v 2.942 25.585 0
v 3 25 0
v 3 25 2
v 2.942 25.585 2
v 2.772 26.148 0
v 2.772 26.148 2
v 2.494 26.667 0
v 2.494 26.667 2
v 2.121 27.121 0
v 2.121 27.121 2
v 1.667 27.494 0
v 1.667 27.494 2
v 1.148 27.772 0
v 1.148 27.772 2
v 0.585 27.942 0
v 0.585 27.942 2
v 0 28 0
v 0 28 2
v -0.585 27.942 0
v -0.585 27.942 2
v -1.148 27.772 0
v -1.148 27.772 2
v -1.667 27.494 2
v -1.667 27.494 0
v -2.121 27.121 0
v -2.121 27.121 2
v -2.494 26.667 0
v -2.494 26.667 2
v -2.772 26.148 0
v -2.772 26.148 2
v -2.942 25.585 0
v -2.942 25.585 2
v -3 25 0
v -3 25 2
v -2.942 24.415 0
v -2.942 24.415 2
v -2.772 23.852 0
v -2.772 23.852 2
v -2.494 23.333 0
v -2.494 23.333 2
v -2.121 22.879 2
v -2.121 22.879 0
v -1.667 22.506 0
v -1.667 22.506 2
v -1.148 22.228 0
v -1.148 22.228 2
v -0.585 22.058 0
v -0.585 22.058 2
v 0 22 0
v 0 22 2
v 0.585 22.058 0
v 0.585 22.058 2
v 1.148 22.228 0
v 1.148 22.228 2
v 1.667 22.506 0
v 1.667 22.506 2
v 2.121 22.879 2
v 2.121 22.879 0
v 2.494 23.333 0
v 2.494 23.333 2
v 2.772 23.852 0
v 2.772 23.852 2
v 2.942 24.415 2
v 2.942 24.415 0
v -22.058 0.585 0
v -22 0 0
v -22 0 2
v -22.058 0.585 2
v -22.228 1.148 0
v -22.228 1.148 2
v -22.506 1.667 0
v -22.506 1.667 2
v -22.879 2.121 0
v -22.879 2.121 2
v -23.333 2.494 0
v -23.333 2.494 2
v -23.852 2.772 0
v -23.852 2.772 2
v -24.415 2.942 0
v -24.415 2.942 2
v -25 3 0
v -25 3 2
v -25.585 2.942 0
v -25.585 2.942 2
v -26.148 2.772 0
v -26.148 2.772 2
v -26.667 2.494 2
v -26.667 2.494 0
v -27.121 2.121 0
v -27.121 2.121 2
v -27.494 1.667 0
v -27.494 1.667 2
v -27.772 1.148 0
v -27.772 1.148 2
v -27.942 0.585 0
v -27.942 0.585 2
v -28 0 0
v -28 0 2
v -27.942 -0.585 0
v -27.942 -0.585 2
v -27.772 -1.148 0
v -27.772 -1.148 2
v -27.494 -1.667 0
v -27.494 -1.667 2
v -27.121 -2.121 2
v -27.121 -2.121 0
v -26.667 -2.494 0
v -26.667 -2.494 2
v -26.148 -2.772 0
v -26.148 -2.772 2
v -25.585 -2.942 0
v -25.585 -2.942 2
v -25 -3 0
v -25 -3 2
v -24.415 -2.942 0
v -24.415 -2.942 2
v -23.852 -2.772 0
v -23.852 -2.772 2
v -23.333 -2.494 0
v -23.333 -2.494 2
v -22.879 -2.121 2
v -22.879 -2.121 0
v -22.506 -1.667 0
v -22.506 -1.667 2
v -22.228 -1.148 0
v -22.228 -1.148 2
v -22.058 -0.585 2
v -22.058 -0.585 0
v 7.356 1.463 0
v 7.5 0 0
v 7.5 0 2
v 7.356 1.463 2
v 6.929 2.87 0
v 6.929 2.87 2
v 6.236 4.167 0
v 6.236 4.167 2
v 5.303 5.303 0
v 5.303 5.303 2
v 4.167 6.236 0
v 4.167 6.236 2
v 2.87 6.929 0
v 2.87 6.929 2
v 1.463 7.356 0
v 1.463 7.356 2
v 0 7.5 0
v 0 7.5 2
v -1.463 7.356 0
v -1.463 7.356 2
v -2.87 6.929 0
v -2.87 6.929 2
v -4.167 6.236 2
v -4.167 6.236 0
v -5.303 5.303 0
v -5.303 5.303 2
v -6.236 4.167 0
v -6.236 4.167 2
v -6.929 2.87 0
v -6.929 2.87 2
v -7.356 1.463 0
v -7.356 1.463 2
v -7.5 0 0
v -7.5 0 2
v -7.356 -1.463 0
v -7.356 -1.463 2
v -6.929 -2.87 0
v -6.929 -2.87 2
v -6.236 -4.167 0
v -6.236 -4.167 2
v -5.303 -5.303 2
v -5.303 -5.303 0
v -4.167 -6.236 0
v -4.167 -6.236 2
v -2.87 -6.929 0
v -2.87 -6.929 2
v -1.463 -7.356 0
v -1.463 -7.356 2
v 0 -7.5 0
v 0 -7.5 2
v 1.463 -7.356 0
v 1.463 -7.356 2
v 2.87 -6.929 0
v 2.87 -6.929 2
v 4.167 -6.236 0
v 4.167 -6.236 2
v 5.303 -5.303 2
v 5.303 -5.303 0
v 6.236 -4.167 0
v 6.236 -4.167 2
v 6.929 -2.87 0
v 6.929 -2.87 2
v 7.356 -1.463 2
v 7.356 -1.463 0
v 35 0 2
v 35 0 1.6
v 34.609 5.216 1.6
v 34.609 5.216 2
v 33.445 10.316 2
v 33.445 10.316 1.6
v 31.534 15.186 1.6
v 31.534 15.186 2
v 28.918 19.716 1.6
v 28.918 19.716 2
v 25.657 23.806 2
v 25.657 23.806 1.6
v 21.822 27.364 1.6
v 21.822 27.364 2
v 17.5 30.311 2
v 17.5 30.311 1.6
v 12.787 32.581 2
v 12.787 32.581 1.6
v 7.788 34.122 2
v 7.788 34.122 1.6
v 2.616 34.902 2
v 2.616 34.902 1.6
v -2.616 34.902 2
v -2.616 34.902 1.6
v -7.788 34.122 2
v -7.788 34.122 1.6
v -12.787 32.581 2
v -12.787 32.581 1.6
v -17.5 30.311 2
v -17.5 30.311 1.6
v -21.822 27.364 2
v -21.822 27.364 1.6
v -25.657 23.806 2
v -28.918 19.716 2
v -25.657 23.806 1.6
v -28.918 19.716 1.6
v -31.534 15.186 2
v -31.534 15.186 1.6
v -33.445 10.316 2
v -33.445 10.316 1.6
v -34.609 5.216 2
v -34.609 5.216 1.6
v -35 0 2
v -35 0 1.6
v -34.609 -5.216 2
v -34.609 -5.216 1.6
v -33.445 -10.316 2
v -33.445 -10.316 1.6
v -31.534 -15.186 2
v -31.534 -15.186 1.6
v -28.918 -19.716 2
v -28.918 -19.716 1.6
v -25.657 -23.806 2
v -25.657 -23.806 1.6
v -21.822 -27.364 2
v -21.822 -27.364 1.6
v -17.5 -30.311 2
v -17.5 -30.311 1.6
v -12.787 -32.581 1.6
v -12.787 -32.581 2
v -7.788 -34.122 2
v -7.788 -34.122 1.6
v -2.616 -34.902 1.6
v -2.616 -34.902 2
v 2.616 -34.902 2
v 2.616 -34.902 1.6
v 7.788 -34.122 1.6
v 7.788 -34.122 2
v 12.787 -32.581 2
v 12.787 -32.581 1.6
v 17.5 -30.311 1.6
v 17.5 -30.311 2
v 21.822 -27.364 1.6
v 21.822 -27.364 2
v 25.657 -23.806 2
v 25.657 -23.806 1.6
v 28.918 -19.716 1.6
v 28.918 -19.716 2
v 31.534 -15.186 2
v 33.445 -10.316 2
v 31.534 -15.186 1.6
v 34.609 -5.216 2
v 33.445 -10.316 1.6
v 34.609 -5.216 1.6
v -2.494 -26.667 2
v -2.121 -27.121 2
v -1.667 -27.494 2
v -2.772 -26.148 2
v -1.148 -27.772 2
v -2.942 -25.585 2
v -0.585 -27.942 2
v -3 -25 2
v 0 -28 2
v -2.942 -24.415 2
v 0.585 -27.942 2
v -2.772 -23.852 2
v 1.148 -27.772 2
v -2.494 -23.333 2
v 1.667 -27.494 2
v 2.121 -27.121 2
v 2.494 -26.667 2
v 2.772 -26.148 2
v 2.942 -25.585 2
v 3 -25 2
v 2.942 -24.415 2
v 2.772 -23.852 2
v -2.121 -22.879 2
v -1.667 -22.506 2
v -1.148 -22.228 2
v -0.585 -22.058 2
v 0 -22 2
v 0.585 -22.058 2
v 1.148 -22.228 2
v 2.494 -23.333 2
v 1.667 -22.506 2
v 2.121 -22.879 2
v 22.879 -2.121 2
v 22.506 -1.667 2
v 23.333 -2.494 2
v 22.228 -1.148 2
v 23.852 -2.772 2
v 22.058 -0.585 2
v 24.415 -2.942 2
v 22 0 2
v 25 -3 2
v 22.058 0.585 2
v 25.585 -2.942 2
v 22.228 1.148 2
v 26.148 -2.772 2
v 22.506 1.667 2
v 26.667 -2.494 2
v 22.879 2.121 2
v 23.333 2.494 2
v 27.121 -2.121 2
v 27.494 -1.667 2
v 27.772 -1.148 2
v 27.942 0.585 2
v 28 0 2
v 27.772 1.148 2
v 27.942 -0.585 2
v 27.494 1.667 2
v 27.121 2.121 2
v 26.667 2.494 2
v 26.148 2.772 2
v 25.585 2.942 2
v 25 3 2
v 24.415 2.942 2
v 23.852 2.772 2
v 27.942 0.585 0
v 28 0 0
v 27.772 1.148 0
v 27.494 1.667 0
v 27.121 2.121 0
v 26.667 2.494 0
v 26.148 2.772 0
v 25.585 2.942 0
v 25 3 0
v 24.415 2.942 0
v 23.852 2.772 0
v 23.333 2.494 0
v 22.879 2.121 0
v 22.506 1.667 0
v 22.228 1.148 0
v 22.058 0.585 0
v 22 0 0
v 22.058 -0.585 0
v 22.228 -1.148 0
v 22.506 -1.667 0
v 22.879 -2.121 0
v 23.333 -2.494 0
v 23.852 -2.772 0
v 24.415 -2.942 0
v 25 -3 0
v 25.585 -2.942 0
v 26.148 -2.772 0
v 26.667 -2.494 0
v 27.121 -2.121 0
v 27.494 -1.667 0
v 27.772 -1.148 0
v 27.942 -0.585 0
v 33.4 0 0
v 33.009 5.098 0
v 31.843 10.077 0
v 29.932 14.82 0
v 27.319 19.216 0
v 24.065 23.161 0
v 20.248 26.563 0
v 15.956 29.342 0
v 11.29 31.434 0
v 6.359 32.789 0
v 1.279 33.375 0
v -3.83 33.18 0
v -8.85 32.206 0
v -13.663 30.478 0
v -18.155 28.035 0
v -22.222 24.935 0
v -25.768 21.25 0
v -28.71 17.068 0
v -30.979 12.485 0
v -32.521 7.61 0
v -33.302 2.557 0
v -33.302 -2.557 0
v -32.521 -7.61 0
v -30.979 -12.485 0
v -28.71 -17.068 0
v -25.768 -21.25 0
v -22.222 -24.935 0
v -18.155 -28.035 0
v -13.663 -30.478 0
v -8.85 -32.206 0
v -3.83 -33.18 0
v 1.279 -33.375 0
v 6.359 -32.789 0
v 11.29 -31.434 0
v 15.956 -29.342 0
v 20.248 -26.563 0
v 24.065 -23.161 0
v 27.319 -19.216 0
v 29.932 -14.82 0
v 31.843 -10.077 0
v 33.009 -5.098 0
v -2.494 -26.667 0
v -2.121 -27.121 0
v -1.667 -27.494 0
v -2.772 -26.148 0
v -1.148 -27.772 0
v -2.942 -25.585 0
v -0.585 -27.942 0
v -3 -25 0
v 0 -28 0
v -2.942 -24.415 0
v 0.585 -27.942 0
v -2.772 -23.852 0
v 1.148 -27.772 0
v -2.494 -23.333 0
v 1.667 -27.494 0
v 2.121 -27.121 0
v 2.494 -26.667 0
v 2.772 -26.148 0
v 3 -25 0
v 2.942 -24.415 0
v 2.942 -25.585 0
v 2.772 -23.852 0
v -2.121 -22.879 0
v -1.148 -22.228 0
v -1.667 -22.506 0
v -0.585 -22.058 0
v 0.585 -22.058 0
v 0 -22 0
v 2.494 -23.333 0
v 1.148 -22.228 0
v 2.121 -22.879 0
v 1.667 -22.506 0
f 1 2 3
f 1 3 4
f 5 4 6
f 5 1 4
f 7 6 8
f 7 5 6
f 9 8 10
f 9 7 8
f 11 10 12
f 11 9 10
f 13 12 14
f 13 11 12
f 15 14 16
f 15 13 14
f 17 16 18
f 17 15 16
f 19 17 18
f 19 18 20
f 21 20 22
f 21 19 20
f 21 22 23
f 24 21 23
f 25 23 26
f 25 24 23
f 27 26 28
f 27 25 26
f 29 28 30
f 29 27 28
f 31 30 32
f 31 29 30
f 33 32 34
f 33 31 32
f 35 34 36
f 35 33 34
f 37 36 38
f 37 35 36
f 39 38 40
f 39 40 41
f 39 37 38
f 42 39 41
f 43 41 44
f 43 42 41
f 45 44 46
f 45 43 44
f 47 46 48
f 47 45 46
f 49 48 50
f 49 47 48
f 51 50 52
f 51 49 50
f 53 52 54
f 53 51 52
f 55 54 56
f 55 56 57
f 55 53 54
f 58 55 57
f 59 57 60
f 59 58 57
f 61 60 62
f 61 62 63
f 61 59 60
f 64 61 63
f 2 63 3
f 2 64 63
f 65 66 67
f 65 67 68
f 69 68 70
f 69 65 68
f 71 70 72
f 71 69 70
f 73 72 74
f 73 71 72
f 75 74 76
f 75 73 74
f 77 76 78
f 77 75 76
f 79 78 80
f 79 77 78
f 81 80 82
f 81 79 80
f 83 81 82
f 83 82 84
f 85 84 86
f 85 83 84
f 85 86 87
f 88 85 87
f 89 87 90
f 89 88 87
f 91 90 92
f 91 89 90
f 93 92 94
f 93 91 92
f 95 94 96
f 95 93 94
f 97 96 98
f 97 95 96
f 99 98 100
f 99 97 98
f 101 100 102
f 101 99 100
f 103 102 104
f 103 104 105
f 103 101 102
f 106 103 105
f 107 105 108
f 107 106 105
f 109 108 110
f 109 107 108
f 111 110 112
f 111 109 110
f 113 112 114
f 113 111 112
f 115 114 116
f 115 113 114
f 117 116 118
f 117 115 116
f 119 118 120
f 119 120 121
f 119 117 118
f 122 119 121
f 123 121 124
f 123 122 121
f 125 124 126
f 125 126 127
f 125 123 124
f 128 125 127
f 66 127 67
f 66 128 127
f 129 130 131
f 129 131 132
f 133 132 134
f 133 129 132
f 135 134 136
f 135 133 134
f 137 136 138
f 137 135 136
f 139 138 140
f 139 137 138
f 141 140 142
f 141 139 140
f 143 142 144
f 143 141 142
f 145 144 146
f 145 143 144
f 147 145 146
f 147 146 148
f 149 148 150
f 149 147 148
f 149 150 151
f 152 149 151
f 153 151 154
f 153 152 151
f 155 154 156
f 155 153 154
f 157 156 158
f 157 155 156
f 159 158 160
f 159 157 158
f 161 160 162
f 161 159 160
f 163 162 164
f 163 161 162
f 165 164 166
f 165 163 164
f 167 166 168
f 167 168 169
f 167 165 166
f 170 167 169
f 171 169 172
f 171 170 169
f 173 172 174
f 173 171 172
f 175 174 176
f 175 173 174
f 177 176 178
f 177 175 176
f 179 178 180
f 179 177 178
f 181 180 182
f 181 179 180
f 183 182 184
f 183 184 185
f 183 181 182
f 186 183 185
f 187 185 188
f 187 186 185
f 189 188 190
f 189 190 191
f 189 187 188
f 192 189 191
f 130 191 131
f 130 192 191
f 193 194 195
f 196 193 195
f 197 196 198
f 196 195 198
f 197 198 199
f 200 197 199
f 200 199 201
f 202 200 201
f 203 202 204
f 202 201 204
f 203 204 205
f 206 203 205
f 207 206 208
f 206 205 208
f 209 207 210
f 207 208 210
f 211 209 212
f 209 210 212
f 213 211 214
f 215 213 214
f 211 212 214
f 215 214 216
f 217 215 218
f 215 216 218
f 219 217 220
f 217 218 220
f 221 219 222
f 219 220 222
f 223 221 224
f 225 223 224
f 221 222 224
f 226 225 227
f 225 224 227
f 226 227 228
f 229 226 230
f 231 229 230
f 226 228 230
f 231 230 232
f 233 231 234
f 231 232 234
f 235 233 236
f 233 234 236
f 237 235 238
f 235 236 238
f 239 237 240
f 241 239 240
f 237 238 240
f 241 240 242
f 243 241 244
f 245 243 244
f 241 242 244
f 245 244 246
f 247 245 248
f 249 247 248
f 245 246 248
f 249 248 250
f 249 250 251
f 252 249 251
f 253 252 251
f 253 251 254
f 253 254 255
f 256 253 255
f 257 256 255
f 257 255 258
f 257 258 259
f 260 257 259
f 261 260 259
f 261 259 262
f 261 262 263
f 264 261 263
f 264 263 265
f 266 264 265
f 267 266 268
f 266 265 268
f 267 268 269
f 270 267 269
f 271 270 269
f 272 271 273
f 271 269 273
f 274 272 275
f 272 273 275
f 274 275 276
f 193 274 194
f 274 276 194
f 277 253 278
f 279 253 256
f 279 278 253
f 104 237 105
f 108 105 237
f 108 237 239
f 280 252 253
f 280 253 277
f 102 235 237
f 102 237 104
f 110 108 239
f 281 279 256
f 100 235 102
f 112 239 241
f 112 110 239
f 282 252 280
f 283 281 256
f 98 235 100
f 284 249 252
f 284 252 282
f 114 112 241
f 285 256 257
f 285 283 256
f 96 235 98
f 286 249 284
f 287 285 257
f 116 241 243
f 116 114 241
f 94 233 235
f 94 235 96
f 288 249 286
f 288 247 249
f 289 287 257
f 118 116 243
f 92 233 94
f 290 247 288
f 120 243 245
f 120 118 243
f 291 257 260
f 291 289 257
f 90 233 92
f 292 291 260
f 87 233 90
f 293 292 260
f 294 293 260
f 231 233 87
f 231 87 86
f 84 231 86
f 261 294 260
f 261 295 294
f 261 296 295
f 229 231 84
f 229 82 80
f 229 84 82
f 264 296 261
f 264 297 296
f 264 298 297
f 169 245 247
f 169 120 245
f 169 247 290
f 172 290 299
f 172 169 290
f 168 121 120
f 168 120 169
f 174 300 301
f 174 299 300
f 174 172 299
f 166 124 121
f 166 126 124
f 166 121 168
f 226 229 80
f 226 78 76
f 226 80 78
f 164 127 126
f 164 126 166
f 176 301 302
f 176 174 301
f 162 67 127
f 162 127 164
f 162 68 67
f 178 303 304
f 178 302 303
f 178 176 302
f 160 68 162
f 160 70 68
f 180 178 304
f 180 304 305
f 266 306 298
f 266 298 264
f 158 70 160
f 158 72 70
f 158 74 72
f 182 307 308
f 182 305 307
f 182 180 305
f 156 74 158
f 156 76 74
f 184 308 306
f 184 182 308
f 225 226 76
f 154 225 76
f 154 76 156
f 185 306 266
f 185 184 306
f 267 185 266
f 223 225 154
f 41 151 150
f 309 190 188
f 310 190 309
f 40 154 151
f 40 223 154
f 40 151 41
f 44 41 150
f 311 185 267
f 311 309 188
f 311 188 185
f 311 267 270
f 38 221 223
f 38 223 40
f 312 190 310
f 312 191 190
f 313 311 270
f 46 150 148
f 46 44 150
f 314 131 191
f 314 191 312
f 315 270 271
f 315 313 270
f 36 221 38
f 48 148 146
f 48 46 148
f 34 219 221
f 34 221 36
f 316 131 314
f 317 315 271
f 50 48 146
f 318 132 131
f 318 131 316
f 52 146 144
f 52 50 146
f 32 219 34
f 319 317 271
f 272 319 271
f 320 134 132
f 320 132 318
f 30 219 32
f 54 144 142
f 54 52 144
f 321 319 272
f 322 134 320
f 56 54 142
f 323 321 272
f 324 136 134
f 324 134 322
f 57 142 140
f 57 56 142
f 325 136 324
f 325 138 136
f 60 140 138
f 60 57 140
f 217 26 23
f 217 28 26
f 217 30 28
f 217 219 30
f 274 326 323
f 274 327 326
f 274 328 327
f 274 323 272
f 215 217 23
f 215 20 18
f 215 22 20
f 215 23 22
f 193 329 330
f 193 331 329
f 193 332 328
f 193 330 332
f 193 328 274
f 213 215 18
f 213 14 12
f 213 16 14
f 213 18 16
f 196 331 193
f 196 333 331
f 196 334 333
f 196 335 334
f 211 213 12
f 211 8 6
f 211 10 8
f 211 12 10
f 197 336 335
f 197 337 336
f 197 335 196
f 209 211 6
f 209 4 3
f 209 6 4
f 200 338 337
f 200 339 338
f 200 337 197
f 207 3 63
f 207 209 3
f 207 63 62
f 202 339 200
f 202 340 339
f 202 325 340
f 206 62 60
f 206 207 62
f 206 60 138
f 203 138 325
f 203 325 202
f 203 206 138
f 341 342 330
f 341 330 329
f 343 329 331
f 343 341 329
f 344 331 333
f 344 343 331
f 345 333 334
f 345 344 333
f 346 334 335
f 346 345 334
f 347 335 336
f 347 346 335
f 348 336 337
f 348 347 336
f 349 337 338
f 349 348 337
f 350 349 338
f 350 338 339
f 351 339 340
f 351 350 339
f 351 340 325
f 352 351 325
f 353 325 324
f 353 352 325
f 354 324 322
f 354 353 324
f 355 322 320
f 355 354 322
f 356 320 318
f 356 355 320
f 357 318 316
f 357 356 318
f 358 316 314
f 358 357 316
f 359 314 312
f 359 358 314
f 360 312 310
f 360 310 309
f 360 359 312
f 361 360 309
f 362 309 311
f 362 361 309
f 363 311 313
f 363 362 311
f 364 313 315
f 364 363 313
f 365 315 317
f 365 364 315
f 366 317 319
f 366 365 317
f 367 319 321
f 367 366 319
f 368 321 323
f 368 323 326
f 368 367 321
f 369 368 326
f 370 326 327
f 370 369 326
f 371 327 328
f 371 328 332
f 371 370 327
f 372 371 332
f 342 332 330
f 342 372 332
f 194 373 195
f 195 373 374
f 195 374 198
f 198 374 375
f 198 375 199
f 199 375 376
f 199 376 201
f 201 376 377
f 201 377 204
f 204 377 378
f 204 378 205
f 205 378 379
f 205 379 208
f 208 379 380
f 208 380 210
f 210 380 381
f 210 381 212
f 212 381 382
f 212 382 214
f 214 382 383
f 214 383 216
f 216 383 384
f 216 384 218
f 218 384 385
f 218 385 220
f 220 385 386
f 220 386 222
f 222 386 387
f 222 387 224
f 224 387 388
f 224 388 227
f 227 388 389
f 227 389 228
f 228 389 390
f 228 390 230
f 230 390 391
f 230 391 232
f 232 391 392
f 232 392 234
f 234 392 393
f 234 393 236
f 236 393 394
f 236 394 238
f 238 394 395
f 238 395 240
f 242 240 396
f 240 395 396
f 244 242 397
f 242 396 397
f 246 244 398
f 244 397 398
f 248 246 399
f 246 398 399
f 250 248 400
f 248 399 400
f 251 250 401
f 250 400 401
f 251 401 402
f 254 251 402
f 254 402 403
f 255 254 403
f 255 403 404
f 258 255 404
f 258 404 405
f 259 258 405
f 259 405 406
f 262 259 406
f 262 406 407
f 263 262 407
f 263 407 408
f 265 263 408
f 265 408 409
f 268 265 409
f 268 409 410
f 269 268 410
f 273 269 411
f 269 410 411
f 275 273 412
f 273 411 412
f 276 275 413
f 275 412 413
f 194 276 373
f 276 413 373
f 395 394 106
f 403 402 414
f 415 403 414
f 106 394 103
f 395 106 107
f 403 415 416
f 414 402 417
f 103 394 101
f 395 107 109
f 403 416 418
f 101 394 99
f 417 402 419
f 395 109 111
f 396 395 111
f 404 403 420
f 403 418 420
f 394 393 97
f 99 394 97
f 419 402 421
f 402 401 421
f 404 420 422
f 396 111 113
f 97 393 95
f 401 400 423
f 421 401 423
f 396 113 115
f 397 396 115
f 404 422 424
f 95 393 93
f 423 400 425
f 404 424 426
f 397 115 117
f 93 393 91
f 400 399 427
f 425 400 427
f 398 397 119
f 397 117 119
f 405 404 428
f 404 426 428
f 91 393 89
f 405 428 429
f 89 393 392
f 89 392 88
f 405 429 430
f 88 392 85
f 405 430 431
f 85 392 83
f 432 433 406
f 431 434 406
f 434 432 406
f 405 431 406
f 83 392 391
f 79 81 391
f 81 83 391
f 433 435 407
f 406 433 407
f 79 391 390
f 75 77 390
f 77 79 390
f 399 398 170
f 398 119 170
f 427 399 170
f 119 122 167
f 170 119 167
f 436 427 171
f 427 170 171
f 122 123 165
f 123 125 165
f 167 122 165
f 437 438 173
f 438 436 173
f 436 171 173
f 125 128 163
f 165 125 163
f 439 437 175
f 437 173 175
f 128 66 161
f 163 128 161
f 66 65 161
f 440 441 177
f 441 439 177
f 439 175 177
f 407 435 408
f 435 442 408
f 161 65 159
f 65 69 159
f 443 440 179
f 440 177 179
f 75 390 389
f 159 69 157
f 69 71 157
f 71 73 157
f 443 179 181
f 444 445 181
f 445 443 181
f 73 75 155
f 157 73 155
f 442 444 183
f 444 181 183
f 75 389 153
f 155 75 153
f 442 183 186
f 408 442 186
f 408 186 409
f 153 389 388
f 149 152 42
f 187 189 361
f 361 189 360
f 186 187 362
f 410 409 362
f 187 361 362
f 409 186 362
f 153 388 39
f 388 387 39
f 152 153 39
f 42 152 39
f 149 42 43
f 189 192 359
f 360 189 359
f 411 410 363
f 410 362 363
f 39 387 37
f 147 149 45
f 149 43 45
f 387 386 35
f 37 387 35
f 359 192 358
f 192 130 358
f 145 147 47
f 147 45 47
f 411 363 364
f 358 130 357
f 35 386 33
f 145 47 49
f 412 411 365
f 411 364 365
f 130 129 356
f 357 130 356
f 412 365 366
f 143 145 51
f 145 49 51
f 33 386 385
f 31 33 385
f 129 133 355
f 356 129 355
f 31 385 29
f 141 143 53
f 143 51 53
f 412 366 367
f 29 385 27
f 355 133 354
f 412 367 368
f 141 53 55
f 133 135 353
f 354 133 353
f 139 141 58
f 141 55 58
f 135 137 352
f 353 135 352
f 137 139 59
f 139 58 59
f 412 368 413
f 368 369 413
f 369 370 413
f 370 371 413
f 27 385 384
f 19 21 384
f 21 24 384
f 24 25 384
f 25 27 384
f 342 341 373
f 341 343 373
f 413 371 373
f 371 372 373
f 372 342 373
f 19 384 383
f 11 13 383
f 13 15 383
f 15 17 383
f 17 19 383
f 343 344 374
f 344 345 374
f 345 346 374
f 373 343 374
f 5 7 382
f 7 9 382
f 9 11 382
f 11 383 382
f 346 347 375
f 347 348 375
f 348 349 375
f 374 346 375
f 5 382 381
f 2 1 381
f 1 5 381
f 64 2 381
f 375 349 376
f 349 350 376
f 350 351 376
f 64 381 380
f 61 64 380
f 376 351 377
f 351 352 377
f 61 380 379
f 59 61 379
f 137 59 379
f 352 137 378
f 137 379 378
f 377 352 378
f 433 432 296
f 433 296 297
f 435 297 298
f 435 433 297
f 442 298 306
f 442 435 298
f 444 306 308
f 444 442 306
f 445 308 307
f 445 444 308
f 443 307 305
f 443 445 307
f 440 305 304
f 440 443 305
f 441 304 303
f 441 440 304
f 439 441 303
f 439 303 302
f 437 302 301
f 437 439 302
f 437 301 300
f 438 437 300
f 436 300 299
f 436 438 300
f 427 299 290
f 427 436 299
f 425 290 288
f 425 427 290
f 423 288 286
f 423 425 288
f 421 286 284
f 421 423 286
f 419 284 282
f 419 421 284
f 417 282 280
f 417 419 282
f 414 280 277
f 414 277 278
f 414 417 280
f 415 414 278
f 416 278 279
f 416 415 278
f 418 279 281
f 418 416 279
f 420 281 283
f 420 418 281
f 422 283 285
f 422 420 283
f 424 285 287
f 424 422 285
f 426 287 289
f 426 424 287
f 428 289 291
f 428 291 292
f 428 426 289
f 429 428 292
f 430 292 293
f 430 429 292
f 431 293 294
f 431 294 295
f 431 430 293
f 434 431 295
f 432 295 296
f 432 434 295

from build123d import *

# Parameters (mm, degrees)
SKETCH1_R           = 35
SKETCH1_R_2         = 7.5
SKETCH1_R_3         = 3
BOSS_EXTRUDE1_DEPTH = 2
CHAMFER1_SIZE       = 1.6


with BuildPart() as part:
    # Sketch1 → Boss-Extrude1 (new body)
    with BuildSketch(Plane.XY):
        Circle(SKETCH1_R)
        Circle(SKETCH1_R_2, mode=Mode.SUBTRACT)
        with Locations((25, 0)):
            Circle(SKETCH1_R_3, mode=Mode.SUBTRACT)
        with Locations((0, -25)):
            Circle(SKETCH1_R_3, mode=Mode.SUBTRACT)
        with Locations((-25, 0)):
            Circle(SKETCH1_R_3, mode=Mode.SUBTRACT)
        with Locations((0, 25)):
            Circle(SKETCH1_R_3, mode=Mode.SUBTRACT)
    extrude(amount=BOSS_EXTRUDE1_DEPTH)

    # Chamfer1
    chamfer1_edges = [part.edges().sort_by_distance(p)[0] for p in [
        (-35, 0, 0),
    ]]
    chamfer(chamfer1_edges, length=CHAMFER1_SIZE)


solid = part.part
